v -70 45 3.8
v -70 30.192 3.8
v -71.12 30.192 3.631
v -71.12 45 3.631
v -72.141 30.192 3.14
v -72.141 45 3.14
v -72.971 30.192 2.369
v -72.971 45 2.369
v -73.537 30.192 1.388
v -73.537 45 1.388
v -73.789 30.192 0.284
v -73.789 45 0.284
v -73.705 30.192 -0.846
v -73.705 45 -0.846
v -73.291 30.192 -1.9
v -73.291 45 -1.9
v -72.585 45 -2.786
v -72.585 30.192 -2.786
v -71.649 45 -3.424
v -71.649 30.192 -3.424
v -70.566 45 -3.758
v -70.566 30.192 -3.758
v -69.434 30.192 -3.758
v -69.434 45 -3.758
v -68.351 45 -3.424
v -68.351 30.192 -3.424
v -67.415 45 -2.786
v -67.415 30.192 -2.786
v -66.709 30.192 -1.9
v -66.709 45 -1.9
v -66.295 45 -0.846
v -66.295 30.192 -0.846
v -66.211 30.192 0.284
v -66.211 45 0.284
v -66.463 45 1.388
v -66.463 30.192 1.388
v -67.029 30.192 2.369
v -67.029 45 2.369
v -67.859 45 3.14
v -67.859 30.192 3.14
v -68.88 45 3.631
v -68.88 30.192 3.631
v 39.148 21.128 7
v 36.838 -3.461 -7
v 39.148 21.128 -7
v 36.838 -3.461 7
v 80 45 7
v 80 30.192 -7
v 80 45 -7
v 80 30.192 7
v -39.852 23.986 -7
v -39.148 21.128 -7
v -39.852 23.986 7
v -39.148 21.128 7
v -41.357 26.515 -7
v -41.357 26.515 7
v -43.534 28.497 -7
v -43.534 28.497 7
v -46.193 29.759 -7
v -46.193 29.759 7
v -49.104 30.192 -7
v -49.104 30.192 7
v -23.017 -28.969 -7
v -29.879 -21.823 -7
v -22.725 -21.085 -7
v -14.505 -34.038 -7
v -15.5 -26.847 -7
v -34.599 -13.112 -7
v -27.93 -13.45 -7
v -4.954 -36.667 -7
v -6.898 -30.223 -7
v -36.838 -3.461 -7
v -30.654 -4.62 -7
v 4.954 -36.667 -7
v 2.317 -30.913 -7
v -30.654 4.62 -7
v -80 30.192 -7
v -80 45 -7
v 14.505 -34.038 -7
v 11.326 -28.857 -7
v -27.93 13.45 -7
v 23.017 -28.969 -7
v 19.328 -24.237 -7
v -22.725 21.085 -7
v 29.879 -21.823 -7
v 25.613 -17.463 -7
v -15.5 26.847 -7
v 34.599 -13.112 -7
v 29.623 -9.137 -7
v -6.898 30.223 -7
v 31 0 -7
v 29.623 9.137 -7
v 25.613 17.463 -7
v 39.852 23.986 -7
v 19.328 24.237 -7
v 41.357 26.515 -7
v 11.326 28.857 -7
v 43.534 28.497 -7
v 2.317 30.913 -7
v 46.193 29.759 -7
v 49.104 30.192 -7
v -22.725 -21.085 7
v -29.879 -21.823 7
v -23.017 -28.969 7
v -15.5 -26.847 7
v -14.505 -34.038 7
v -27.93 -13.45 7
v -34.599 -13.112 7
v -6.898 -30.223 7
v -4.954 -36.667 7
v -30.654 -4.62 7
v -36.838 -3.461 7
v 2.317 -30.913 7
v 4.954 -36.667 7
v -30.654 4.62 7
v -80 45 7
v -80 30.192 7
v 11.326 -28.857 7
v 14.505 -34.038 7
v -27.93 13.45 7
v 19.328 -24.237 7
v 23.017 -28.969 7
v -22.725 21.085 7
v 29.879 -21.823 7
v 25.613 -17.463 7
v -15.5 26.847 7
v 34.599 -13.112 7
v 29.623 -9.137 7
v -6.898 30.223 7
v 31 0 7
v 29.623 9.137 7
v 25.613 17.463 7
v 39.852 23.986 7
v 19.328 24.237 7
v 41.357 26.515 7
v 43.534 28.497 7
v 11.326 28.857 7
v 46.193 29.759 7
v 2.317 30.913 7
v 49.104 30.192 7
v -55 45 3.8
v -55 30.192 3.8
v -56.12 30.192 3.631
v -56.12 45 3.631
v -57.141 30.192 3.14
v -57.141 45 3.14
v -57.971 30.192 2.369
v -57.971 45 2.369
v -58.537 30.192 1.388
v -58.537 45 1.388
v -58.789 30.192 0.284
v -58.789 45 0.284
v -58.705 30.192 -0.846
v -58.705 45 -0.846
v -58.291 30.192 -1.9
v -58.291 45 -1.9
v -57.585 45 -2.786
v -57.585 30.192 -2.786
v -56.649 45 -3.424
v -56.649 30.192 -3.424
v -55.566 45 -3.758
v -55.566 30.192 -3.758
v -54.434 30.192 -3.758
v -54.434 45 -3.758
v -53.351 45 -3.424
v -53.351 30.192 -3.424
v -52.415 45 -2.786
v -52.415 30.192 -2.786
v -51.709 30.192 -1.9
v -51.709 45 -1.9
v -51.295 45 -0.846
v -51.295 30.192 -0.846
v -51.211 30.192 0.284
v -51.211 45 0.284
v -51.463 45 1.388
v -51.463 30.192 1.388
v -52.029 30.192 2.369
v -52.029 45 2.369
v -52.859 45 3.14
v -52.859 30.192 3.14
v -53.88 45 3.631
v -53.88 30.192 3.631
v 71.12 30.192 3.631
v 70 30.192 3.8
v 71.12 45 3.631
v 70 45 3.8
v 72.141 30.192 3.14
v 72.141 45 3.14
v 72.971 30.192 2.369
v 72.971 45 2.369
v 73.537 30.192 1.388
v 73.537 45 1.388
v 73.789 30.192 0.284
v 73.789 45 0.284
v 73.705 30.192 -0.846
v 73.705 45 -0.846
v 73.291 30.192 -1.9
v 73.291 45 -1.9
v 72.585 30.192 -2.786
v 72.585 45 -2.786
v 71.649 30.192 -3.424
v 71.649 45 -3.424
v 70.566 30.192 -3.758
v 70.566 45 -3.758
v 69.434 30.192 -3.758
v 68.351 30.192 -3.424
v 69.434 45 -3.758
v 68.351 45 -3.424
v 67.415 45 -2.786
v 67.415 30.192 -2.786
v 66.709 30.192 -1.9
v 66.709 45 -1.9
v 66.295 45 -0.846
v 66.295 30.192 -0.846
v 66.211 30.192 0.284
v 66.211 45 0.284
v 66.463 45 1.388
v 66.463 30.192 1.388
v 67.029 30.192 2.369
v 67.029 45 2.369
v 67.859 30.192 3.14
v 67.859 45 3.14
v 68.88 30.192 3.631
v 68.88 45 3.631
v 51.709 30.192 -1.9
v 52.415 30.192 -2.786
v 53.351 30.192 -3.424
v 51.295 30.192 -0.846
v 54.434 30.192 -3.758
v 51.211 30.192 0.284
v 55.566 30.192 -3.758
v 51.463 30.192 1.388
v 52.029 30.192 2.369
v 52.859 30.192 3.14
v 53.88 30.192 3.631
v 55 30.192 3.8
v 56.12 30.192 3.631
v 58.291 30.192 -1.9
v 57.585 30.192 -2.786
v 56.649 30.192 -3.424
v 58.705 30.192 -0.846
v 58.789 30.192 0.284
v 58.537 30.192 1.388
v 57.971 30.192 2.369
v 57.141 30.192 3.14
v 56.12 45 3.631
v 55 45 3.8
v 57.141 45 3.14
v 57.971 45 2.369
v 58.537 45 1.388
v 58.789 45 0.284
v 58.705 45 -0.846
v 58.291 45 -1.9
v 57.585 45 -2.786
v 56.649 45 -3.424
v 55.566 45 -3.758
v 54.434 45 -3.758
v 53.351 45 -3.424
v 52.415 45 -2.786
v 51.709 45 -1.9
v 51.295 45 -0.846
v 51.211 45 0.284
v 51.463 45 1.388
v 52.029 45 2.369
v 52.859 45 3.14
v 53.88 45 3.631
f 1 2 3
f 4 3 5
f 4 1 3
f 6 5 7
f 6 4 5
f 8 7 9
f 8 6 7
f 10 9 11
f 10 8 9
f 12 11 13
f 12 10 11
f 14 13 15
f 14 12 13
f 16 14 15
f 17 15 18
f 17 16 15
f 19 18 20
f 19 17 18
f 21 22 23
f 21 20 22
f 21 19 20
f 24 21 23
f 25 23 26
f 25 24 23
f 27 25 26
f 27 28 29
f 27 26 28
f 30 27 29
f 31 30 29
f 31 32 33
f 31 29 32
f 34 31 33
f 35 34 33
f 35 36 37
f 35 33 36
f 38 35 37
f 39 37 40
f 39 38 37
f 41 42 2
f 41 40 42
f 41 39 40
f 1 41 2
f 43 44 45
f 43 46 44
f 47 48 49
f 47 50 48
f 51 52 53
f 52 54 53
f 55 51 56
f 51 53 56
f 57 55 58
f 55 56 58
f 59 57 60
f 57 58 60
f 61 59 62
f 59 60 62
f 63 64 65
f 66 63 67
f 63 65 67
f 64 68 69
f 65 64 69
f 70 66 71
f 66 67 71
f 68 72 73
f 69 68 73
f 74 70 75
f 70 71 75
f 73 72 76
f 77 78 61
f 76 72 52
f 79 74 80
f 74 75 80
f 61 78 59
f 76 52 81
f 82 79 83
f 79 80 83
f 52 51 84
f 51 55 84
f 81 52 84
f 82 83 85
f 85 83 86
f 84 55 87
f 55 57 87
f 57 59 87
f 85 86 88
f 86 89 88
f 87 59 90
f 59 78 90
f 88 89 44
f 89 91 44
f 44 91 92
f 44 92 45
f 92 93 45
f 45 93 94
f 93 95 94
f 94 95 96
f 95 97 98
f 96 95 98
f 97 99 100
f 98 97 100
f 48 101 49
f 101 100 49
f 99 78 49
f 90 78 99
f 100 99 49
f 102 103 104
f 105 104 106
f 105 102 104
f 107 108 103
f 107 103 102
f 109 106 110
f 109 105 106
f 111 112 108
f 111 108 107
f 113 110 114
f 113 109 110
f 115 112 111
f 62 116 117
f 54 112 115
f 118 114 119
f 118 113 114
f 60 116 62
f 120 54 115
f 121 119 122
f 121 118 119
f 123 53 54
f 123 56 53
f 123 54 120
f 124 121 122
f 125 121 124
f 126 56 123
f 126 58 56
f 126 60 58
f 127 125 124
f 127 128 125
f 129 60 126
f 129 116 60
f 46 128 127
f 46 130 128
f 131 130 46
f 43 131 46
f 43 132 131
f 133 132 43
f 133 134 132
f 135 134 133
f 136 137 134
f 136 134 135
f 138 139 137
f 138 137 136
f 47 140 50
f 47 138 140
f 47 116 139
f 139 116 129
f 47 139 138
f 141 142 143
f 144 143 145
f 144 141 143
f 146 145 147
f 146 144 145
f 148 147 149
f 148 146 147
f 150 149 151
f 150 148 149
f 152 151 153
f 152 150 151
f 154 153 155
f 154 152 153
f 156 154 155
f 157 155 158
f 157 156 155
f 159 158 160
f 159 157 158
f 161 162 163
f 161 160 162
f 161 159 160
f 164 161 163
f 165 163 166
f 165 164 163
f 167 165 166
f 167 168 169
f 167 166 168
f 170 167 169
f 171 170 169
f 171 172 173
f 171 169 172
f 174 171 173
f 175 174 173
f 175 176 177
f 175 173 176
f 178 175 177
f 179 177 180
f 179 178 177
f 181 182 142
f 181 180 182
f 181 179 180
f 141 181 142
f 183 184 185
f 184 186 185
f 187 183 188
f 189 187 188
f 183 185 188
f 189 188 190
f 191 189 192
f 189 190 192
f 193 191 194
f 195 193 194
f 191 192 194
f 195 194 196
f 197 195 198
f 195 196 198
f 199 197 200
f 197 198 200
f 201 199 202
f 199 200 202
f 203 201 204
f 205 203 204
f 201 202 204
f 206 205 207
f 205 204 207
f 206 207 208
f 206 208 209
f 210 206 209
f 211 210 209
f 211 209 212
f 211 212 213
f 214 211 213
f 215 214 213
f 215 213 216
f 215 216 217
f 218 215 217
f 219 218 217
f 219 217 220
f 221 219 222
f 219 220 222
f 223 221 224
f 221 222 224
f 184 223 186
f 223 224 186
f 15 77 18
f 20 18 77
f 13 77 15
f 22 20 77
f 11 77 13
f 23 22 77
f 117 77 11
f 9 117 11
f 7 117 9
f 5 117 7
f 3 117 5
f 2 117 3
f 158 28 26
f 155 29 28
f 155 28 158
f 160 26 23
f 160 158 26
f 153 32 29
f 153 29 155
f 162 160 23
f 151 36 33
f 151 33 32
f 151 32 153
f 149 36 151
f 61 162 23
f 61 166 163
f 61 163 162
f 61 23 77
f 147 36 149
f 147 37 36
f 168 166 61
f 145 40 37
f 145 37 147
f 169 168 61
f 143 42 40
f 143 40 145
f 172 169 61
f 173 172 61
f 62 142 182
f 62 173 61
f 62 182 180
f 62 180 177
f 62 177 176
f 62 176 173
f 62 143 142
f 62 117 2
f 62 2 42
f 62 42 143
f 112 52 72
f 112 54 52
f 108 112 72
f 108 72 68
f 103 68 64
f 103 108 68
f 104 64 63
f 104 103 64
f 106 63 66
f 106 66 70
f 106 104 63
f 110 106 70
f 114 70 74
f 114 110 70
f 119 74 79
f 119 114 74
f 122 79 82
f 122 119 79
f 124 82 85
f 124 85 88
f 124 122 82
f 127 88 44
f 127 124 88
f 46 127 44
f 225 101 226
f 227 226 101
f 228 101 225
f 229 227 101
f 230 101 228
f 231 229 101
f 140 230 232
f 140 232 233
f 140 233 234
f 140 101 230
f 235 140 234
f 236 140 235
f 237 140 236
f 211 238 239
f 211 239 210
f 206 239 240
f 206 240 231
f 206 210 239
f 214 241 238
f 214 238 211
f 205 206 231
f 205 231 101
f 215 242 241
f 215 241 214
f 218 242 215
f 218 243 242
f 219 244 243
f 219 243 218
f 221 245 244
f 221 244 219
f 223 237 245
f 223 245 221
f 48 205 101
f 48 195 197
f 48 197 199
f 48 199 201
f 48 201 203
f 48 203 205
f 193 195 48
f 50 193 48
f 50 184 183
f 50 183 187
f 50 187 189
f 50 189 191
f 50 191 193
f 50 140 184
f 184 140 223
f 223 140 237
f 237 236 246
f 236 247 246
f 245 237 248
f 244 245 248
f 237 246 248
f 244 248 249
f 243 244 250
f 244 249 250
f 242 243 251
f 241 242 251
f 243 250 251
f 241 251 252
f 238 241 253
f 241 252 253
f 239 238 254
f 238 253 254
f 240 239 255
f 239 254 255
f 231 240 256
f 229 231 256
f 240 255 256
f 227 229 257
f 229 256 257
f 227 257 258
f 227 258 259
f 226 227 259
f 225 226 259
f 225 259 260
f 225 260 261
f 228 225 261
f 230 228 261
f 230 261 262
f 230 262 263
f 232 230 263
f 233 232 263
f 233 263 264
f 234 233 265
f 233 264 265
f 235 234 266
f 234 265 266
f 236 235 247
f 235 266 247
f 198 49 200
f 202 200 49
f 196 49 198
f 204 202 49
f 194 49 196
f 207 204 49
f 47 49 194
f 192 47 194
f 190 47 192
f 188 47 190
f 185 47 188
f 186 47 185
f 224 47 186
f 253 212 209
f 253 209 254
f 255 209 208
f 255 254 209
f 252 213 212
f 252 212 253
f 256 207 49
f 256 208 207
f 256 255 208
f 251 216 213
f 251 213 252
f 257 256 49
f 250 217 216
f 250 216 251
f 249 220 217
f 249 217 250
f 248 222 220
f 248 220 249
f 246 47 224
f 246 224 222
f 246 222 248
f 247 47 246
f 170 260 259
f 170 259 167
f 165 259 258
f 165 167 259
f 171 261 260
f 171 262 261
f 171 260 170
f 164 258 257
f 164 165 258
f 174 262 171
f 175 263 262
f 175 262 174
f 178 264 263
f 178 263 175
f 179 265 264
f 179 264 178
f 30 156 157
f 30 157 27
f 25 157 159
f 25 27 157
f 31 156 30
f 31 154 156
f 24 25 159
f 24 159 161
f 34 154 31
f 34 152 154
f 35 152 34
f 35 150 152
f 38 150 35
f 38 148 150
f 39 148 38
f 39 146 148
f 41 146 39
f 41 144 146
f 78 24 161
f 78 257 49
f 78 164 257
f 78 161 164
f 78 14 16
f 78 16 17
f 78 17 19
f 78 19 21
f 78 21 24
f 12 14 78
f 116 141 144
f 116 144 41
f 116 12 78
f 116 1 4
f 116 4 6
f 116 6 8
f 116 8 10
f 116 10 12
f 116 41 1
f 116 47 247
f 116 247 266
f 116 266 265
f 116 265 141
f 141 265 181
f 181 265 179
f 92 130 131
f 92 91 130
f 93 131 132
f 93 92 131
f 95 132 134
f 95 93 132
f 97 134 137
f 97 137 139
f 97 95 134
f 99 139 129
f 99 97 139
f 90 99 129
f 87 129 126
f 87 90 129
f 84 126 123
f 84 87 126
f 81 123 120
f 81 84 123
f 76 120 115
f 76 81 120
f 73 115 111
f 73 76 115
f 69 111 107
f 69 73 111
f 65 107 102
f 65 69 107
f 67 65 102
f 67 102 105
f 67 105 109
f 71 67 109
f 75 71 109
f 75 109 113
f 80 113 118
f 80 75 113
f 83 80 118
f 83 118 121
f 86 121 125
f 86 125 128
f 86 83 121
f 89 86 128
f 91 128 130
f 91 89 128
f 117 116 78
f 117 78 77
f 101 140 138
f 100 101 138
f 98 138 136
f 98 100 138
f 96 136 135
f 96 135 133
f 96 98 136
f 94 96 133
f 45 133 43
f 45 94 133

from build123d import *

# Parameters (mm, degrees)
SKETCH1_R                     = 31
BOSS_EXTRUDE1_DEPTH           = 7
FILLET1_R                     = 10
M7_CLEARANCE_HOLE1_AT_2_COUNT = 2
M7_CLEARANCE_HOLE1_AT_2_PITCH = 15


with BuildPart() as part:
    # Sketch1 → Boss-Extrude1 (new body, symmetric)
    with BuildSketch(Plane.XY):
        with BuildLine():
            Line((80, 45), (-80, 45))
            Line((-80, 45), (-80, 30.19235911))
            Line((-80, 30.19235911), (-40, 30.19235911))
            Line((-40, 30.19235911), (-36.83773054, -3.461446031))
            ThreePointArc((-36.83773054, -3.461446031), (0, -37), (36.83773054, -3.461446031))
            Line((36.83773054, -3.461446031), (40, 30.19235911))
            Line((40, 30.19235911), (80, 30.19235911))
            Line((80, 30.19235911), (80, 45))
        make_face()
        Circle(SKETCH1_R, mode=Mode.SUBTRACT)
    extrude(amount=BOSS_EXTRUDE1_DEPTH, both=True)

    # Fillet1
    fillet1_edges = [part.edges().sort_by_distance(p)[0] for p in [
        (-40, 30.19235911, 0),
        (40, 30.19235911, 0),
    ]]
    fillet(fillet1_edges, radius=FILLET1_R)

    # Sketch4 → M7 Clearance Hole1 (revolve, cut)
    with BuildSketch(Plane(origin=(-70, 45, 0), x_dir=(0, 0, 1), z_dir=(1, 0, 0))):
        Polygon((0, 0), (0, 22.033270352), (3.8, 19.75), (3.8, 0), align=None)
    m7_clearance_hole1 = revolve(axis=Axis((-70, 51.35, 0), (0, -1, 0)), mode=Mode.SUBTRACT)

    # M7 Clearance Hole1 at 2: M7 Clearance Hole1 ×2
    with Locations(*[(i * M7_CLEARANCE_HOLE1_AT_2_PITCH, 0, 0) for i in range(1, M7_CLEARANCE_HOLE1_AT_2_COUNT)]):
        add(m7_clearance_hole1, mode=Mode.SUBTRACT)

    # Mirror1: M7 Clearance Hole1 across plane
    add(m7_clearance_hole1.mirror(Plane(origin=(0, 0, 0), x_dir=(0, 0, 1), z_dir=(1, 0, 0))), mode=Mode.SUBTRACT)

    # Mirror1 copy 1 sketch → Mirror1 copy 1 (revolve, cut)
    with BuildSketch(Plane(origin=(55, 45, 0), x_dir=(0, 0, 1), z_dir=(-1, 0, 0))):
        Polygon((0, 0), (0, -22.033270352), (3.8, -19.75), (3.8, 0), align=None)
    revolve(axis=Axis((55, 51.35, 0), (0, 1, 0)), mode=Mode.SUBTRACT)


solid = part.part
